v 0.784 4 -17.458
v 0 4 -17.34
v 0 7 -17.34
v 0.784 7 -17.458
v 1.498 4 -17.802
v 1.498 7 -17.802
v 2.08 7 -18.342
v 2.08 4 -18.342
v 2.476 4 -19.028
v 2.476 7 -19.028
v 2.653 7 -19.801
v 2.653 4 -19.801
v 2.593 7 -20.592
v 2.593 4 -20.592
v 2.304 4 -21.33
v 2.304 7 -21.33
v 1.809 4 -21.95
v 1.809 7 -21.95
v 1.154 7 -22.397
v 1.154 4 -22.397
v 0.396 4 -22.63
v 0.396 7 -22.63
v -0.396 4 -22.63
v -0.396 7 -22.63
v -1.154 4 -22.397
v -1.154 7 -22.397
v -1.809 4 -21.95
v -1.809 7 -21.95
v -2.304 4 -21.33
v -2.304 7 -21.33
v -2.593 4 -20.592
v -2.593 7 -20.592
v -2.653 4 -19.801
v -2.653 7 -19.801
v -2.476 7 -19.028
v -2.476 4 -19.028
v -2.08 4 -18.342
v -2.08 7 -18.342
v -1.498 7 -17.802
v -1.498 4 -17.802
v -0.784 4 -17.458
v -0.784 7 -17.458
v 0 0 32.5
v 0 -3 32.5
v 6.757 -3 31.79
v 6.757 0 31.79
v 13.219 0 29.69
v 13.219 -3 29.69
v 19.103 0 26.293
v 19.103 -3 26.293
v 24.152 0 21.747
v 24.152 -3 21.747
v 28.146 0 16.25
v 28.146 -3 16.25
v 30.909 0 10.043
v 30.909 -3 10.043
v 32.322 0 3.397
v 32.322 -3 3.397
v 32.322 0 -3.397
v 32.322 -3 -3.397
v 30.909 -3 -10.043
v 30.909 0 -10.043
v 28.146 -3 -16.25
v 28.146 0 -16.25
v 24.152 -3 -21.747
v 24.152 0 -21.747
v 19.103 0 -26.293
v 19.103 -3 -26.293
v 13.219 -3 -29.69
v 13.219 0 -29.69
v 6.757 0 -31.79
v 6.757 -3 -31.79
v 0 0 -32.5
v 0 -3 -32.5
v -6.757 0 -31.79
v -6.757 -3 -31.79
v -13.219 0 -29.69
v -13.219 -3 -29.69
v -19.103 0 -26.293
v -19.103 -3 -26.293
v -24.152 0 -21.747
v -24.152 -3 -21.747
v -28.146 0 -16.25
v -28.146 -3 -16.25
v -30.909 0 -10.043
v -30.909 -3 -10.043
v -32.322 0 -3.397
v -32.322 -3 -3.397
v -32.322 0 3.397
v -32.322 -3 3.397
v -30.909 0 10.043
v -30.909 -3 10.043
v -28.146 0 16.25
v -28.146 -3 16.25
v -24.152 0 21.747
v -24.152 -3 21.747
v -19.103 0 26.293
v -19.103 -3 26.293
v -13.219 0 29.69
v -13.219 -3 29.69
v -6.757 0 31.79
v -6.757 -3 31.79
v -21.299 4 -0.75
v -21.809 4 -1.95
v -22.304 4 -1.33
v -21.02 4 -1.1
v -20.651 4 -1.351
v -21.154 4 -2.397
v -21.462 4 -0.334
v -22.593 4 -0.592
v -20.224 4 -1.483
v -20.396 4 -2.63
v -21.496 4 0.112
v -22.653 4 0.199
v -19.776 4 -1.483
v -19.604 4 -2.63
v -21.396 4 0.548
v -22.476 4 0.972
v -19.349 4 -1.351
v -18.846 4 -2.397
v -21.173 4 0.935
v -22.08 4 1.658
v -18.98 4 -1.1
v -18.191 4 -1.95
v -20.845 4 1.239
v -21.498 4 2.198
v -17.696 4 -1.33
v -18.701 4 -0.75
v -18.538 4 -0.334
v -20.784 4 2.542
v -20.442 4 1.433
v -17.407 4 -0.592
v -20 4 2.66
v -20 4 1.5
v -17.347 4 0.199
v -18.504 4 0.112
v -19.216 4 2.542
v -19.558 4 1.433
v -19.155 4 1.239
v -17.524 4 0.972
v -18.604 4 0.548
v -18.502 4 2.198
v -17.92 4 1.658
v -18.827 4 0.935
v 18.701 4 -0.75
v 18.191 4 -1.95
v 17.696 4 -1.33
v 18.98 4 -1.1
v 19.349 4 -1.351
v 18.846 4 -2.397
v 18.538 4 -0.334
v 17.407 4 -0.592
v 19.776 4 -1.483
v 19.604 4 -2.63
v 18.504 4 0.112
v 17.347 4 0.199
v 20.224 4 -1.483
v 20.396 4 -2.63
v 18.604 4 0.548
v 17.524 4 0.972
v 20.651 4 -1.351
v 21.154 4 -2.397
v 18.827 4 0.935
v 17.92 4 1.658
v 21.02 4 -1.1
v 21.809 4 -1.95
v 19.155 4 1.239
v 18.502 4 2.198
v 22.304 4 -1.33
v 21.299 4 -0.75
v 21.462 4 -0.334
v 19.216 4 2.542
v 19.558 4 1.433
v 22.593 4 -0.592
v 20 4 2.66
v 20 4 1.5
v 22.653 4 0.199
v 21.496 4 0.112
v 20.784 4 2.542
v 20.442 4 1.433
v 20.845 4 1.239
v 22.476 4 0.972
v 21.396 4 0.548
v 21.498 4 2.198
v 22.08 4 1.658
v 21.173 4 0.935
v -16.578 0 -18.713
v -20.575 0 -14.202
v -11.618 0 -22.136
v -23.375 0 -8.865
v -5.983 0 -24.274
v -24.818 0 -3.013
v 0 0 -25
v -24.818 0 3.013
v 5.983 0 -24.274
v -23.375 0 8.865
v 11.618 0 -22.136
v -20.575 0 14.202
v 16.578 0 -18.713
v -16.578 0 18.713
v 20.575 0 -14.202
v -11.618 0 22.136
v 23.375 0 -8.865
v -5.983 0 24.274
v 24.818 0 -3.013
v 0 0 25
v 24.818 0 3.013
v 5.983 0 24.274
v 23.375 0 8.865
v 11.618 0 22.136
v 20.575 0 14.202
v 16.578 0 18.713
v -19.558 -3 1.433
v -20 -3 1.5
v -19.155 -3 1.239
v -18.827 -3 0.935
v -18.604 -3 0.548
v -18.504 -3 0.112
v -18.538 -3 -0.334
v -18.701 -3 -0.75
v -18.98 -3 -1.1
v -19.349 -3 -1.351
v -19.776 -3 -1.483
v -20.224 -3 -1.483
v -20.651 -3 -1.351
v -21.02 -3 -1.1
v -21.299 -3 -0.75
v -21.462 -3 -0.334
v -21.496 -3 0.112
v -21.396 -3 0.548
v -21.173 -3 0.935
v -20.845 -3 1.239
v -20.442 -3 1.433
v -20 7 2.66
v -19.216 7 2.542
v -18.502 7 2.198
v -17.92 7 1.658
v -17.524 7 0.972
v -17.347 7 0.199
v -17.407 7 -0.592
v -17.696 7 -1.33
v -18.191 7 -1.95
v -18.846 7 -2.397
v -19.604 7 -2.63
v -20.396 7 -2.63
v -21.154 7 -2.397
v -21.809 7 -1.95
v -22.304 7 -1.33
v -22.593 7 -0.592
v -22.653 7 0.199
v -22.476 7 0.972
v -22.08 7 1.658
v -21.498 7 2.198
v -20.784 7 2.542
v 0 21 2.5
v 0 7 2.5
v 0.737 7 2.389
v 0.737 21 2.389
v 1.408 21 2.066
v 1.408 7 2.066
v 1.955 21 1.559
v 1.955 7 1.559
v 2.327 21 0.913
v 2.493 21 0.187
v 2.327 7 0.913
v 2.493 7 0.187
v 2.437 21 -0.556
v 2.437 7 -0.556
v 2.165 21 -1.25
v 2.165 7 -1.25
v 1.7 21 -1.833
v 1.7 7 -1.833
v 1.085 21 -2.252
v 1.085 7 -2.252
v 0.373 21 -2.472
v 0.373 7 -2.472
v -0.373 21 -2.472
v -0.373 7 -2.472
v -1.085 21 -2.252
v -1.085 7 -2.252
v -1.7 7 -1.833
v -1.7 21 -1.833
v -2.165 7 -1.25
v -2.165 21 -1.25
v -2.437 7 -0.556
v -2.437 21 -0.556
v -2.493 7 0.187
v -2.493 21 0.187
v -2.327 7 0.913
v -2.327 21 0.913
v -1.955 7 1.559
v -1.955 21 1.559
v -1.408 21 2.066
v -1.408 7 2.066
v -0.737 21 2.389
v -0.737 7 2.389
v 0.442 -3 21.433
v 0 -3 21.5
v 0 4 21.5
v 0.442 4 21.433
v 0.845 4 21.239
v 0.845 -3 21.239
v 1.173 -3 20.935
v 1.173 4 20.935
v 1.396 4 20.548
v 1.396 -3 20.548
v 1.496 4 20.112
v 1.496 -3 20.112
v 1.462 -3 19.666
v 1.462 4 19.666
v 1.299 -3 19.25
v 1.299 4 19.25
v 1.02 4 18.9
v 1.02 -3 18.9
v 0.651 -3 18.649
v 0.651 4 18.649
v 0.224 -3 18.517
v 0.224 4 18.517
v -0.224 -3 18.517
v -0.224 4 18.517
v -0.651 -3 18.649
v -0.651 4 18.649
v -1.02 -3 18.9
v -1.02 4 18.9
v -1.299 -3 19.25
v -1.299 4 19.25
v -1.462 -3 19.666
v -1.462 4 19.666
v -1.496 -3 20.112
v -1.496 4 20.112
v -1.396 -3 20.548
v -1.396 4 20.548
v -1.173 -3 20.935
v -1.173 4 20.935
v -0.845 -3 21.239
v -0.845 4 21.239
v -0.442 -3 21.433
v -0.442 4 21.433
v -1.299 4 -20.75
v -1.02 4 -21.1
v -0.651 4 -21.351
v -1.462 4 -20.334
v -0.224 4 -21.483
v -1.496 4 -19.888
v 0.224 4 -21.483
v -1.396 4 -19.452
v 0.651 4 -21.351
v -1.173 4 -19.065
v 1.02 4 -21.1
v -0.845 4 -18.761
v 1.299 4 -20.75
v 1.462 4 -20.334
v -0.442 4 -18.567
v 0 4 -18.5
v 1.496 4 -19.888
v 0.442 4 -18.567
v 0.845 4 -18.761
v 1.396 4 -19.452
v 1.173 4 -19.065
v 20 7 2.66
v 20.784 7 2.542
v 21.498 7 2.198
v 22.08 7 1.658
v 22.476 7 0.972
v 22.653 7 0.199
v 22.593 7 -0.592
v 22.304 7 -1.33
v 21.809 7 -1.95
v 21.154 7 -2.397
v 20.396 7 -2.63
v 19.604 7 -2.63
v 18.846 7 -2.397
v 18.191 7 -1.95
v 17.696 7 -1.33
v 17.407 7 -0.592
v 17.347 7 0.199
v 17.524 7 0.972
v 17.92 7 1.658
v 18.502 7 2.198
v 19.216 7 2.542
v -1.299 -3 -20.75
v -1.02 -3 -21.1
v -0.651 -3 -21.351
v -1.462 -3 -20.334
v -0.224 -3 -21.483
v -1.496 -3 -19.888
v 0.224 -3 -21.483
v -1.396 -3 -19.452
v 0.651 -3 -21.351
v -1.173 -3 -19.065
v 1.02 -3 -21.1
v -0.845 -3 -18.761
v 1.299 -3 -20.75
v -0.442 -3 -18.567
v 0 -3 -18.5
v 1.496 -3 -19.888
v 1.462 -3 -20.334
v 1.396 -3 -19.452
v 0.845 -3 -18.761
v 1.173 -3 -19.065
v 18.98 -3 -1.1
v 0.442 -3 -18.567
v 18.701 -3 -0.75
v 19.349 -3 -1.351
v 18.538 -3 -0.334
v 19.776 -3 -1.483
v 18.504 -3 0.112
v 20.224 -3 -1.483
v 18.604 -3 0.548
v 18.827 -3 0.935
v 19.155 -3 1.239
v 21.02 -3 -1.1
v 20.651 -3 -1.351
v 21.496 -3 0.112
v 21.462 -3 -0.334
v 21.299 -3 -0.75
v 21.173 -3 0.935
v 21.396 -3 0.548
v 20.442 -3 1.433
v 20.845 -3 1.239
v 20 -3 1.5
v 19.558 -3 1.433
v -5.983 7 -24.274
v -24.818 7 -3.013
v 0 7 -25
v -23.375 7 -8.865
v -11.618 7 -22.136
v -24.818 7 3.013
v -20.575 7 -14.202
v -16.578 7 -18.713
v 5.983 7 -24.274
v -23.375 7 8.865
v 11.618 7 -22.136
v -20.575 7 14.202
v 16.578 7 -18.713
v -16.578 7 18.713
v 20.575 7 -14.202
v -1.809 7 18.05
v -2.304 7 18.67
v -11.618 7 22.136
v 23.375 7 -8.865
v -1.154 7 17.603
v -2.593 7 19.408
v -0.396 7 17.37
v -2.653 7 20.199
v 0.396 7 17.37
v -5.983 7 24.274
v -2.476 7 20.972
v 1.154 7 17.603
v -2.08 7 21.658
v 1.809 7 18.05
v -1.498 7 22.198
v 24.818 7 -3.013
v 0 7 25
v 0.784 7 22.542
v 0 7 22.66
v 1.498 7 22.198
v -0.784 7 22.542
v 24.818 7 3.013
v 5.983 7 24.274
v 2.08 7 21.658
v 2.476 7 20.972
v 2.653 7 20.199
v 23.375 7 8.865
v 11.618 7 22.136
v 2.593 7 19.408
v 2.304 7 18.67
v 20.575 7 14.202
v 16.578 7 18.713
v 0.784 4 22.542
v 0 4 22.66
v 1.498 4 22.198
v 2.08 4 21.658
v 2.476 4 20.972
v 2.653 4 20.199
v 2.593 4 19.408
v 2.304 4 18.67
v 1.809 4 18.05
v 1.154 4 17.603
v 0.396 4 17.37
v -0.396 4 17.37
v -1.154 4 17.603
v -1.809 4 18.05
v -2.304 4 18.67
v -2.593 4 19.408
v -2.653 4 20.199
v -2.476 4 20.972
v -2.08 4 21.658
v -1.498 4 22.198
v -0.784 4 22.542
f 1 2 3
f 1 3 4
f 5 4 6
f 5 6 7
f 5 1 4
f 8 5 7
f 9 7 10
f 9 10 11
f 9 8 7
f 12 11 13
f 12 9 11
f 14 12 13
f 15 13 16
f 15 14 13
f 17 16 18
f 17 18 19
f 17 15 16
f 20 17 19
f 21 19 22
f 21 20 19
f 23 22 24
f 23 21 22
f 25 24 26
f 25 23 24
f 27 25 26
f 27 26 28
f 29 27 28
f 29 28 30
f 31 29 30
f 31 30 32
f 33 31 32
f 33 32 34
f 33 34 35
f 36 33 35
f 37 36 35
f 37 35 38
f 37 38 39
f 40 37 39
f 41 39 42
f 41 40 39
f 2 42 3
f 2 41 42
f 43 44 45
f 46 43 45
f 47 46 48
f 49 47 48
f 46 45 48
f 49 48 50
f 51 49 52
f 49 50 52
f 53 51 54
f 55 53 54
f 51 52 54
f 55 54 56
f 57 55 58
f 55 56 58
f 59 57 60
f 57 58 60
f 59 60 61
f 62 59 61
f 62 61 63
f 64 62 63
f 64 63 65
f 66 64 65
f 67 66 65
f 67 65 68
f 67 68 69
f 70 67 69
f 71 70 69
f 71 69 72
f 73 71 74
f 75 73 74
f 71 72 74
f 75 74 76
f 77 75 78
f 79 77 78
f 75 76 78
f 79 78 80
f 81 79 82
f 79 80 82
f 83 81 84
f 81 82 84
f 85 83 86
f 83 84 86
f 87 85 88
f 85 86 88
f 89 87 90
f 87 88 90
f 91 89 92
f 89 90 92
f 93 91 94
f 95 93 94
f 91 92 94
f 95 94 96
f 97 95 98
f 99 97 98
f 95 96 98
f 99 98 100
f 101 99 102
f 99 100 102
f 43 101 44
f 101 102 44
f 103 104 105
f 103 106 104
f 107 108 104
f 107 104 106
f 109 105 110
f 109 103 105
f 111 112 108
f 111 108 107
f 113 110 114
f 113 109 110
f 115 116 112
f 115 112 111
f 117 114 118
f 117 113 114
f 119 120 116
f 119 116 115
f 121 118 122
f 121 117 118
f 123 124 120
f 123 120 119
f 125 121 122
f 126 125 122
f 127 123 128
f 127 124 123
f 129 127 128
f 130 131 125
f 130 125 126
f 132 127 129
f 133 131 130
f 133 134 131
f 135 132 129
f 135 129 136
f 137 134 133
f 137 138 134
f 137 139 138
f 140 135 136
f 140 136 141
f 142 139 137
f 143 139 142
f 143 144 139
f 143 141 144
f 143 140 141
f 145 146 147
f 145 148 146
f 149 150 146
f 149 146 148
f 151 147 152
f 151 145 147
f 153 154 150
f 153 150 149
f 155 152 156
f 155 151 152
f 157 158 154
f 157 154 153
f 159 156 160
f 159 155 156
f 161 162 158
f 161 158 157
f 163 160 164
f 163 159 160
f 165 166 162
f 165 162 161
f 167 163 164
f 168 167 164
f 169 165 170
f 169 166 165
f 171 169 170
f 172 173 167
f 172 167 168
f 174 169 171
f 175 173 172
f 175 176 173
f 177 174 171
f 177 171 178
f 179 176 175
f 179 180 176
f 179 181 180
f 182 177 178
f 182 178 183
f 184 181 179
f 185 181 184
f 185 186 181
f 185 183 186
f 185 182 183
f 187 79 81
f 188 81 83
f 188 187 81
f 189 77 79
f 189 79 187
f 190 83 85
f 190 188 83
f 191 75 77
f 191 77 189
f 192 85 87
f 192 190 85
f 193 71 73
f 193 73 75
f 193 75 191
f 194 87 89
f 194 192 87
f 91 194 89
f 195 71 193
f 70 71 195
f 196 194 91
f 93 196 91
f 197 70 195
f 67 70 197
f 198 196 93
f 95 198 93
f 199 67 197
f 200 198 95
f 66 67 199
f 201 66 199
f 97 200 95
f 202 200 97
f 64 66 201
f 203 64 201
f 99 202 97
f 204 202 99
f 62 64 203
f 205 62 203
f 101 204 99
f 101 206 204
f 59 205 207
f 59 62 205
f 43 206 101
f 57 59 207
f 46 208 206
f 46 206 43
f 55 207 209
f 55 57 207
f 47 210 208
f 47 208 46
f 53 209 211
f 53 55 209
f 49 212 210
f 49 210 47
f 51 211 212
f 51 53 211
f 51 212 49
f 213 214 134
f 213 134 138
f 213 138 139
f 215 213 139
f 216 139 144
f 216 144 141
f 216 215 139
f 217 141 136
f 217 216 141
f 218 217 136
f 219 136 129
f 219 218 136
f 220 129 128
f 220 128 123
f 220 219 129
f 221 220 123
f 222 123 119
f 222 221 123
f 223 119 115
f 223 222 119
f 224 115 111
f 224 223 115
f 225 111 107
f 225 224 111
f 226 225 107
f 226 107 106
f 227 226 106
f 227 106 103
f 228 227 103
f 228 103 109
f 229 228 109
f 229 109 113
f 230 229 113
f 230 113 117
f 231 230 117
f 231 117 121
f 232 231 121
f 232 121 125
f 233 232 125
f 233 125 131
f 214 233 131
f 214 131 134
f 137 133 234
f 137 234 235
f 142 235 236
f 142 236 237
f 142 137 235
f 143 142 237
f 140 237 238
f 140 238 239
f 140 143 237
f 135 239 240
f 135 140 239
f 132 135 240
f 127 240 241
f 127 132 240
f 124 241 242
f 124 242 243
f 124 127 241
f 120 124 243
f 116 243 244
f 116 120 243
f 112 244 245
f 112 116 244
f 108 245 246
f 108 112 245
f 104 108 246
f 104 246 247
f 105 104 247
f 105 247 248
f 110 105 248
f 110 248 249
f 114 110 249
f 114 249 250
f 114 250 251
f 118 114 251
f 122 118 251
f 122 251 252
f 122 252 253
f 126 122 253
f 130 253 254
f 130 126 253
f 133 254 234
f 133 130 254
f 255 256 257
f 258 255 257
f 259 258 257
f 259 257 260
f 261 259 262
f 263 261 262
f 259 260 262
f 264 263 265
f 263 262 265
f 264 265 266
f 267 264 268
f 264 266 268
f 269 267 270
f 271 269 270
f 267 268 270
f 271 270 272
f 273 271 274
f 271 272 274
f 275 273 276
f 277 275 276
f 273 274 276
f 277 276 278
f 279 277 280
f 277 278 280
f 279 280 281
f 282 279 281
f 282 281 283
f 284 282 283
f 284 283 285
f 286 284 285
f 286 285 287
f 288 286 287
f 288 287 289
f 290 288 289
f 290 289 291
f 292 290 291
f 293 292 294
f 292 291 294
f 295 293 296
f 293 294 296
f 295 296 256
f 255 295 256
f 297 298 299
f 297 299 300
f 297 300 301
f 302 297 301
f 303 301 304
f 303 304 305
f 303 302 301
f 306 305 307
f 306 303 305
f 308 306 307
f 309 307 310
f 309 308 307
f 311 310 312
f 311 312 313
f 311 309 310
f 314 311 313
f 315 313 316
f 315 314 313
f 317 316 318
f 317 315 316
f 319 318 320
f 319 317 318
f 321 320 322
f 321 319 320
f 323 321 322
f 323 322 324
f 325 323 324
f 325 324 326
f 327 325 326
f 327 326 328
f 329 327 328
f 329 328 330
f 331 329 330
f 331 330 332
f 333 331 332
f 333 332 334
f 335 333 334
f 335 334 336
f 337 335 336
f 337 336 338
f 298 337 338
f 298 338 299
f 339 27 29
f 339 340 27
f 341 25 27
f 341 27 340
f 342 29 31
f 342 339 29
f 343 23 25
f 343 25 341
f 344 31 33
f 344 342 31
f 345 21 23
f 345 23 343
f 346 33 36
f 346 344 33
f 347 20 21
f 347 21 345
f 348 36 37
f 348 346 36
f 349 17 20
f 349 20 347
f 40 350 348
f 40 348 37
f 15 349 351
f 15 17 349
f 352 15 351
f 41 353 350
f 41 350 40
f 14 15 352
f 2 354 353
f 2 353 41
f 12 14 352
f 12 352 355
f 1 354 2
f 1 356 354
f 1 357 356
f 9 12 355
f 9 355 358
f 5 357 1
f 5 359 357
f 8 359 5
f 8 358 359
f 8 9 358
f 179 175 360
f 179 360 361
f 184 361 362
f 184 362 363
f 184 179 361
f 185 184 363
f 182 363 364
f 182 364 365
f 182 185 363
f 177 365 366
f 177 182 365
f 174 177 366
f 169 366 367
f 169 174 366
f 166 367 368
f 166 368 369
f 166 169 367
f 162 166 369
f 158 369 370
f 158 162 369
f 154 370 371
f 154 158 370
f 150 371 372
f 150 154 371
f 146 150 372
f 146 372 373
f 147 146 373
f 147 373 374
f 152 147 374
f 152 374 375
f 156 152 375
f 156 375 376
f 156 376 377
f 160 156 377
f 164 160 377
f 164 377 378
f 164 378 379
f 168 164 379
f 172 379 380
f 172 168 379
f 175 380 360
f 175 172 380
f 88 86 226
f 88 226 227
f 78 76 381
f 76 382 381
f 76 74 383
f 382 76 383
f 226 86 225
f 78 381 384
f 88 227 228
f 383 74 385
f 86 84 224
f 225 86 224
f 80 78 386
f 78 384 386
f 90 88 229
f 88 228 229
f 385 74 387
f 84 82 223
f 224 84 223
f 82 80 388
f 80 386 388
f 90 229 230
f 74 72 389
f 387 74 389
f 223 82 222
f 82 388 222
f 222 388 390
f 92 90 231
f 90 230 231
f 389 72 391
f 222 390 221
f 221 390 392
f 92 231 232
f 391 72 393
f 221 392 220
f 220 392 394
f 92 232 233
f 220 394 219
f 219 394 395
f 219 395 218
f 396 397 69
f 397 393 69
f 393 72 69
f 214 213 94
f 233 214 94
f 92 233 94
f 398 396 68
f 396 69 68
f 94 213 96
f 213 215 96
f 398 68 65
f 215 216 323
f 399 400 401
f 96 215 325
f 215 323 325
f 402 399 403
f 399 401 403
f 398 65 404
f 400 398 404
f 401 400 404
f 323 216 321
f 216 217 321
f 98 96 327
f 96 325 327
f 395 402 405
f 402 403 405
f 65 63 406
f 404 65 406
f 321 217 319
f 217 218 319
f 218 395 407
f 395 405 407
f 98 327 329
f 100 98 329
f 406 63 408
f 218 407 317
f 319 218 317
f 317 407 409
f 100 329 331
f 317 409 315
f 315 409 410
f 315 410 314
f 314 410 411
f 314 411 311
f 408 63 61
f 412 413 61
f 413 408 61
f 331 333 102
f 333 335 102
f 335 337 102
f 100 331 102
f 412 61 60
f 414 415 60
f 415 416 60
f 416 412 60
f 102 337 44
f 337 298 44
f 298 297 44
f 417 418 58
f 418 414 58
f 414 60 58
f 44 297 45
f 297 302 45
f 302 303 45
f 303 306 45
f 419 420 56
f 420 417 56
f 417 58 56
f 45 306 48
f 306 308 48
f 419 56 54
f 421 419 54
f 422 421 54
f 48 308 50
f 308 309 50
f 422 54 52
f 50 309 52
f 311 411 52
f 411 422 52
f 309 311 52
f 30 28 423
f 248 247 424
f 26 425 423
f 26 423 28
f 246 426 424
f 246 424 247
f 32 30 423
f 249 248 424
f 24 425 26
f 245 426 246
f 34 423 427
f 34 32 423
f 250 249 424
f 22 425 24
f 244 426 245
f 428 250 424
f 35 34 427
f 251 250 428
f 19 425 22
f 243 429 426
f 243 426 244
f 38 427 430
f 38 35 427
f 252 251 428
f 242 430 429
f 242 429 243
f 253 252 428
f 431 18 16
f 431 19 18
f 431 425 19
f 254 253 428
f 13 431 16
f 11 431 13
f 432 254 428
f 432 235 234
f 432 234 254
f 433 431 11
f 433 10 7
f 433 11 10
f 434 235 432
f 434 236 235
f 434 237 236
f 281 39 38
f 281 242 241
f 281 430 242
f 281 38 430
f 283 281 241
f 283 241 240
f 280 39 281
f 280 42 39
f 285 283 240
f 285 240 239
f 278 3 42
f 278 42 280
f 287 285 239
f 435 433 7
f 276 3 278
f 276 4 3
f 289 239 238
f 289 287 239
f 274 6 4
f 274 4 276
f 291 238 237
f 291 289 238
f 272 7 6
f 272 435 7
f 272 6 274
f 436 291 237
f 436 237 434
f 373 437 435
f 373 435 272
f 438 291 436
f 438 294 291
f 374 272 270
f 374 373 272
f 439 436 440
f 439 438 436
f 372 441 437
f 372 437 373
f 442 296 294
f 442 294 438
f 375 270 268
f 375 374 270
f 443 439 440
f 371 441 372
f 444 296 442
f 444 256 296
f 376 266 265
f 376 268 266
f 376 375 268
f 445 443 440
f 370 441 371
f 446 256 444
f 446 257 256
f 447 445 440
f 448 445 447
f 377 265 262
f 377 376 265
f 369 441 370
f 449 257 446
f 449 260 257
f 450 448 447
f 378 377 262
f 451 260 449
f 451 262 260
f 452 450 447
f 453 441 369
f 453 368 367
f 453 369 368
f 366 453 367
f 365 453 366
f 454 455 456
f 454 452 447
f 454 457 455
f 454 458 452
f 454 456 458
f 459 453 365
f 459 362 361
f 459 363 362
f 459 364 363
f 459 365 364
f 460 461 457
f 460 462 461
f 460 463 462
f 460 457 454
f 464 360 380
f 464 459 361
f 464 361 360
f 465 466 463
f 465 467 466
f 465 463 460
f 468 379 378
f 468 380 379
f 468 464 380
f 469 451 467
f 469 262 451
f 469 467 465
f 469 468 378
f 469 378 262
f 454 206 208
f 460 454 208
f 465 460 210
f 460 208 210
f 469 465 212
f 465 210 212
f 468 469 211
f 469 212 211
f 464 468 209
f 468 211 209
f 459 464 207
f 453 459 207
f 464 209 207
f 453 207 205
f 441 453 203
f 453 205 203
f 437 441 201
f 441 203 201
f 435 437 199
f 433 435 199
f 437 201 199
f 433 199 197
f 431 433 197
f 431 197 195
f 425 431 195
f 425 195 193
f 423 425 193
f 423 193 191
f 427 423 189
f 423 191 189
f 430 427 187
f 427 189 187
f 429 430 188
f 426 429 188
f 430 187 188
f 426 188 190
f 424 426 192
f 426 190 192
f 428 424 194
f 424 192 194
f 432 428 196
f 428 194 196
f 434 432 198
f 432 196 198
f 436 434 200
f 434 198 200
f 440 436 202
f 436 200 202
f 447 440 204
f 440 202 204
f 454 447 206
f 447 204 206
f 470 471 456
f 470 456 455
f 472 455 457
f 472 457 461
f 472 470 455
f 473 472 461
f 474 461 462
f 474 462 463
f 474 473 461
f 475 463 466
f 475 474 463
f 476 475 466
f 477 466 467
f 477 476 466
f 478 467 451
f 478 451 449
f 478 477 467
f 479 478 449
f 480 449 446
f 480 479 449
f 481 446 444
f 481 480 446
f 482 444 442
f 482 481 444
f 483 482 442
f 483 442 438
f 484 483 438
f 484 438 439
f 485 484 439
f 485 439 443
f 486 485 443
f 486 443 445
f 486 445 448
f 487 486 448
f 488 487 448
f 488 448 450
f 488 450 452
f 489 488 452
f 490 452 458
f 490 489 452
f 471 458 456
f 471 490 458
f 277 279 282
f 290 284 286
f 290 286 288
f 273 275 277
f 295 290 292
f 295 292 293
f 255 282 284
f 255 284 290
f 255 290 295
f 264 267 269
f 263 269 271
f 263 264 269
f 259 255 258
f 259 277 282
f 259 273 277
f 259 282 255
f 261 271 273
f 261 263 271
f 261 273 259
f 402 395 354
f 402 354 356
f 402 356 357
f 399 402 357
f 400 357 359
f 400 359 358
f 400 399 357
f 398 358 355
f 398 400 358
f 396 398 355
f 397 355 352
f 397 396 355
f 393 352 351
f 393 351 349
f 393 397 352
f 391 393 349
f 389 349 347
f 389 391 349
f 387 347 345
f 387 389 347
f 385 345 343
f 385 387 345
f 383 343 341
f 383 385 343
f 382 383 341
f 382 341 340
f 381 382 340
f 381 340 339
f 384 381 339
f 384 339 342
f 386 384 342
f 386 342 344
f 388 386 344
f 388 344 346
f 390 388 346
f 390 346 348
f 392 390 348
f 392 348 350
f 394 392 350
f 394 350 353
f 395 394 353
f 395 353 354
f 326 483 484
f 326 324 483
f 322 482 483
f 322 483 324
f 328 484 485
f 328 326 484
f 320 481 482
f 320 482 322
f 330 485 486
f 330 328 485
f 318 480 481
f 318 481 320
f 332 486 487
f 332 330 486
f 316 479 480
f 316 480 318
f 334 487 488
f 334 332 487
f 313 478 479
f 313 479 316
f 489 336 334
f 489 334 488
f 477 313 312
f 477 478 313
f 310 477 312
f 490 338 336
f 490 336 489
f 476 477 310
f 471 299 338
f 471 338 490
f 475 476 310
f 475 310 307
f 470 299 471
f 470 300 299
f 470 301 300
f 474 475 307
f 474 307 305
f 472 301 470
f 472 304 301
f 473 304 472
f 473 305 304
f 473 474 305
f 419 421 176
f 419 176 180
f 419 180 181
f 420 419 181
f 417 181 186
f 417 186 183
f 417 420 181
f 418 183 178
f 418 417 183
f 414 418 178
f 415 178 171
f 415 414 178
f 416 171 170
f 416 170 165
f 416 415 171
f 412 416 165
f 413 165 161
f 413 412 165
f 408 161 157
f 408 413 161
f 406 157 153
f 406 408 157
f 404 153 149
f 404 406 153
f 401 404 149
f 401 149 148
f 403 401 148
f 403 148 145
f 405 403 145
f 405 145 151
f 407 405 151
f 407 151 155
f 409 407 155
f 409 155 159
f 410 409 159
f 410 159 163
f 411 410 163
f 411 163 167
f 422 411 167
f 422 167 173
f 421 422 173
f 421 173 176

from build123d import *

# Parameters (mm, degrees)
SKETCH1_R           = 25
SKETCH1_R_2         = 1.5
BOSS_EXTRUDE1_DEPTH = 7
CUT_EXTRUDE1_START  = -3
SKETCH2_R           = 2.66
SKETCH2_R_2         = 1.5
CUT_EXTRUDE1_DEPTH  = 3
BOSS_EXTRUDE2_START = -3
SKETCH3_R           = 32.5
SKETCH3_R_2         = 1.5
BOSS_EXTRUDE2_DEPTH = 3
SKETCH4_R           = 2.5
BOSS_EXTRUDE3_DEPTH = 14


with BuildPart() as part:
    # Sketch1 → Boss-Extrude1 (new body)
    with BuildSketch(Plane(origin=(0, 0, 0), x_dir=(1, 0, 0), z_dir=(0, 1, 0))):
        with Locations(Location((0, 0, 0), (0, 0, 270))):
            Circle(SKETCH1_R)
        with Locations(Location((0, 20, 0), (0, 0, 270))):
            Circle(SKETCH1_R_2, mode=Mode.SUBTRACT)
        with Locations(Location((20, 0, 0), (0, 0, 270))):
            Circle(SKETCH1_R_2, mode=Mode.SUBTRACT)
        with Locations(Location((0, -20, 0), (0, 0, 270))):
            Circle(SKETCH1_R_2, mode=Mode.SUBTRACT)
        with Locations(Location((-20, 0, 0), (0, 0, 270))):
            Circle(SKETCH1_R_2, mode=Mode.SUBTRACT)
    extrude(amount=BOSS_EXTRUDE1_DEPTH)

    # Sketch2 → Cut-Extrude1 (cut)
    # profile 1 of 4: a face of its own
    with BuildSketch(Plane(origin=(0, 7, 0), x_dir=(1, 0, 0), z_dir=(0, 1, 0)).offset(CUT_EXTRUDE1_START)):
        with Locations(Location((-20, 0, 0), (0, 0, 270))):
            Circle(SKETCH2_R)
        with Locations(Location((-20, 0, 0), (0, 0, 270))):
            Circle(SKETCH2_R_2, mode=Mode.SUBTRACT)
    # profile 2 of 4: a face of its own
    with BuildSketch(Plane(origin=(0, 7, 0), x_dir=(1, 0, 0), z_dir=(0, 1, 0)).offset(CUT_EXTRUDE1_START)):
        with Locations(Location((0, 20, 0), (0, 0, 270))):
            Circle(SKETCH2_R)
        with Locations(Location((0, 20, 0), (0, 0, 270))):
            Circle(SKETCH2_R_2, mode=Mode.SUBTRACT)
    # profile 3 of 4: a face of its own
    with BuildSketch(Plane(origin=(0, 7, 0), x_dir=(1, 0, 0), z_dir=(0, 1, 0)).offset(CUT_EXTRUDE1_START)):
        with Locations(Location((20, 0, 0), (0, 0, 270))):
            Circle(SKETCH2_R)
        with Locations(Location((20, 0, 0), (0, 0, 270))):
            Circle(SKETCH2_R_2, mode=Mode.SUBTRACT)
    # profile 4 of 4: a face of its own
    with BuildSketch(Plane(origin=(0, 7, 0), x_dir=(1, 0, 0), z_dir=(0, 1, 0)).offset(CUT_EXTRUDE1_START)):
        with Locations(Location((0, -20, 0), (0, 0, 270))):
            Circle(SKETCH2_R)
        with Locations(Location((0, -20, 0), (0, 0, 270))):
            Circle(SKETCH2_R_2, mode=Mode.SUBTRACT)
    extrude(amount=CUT_EXTRUDE1_DEPTH, mode=Mode.SUBTRACT)

    # Sketch3 → Boss-Extrude2 (add)
    with BuildSketch(Plane(origin=(0, 0, 0), x_dir=(1, 0, 0), z_dir=(0, 1, 0)).offset(BOSS_EXTRUDE2_START)):
        with Locations(Location((0, 0, 0), (0, 0, 270))):
            Circle(SKETCH3_R)
        with Locations(Location((0, 20, 0), (0, 0, 270))):
            Circle(SKETCH3_R_2, mode=Mode.SUBTRACT)
        with Locations(Location((-20, 0, 0), (0, 0, 270))):
            Circle(SKETCH3_R_2, mode=Mode.SUBTRACT)
        with Locations(Location((0, -20, 0), (0, 0, 270))):
            Circle(SKETCH3_R_2, mode=Mode.SUBTRACT)
        with Locations(Location((20, 0, 0), (0, 0, 270))):
            Circle(SKETCH3_R_2, mode=Mode.SUBTRACT)
    extrude(amount=BOSS_EXTRUDE2_DEPTH)

    # Sketch4 → Boss-Extrude3 (add)
    with BuildSketch(Plane(origin=(0, 7, 0), x_dir=(1, 0, 0), z_dir=(0, 1, 0))):
        with Locations(Location((0, 0, 0), (0, 0, 270))):
            Circle(SKETCH4_R)
    extrude(amount=BOSS_EXTRUDE3_DEPTH)


solid = part.part
